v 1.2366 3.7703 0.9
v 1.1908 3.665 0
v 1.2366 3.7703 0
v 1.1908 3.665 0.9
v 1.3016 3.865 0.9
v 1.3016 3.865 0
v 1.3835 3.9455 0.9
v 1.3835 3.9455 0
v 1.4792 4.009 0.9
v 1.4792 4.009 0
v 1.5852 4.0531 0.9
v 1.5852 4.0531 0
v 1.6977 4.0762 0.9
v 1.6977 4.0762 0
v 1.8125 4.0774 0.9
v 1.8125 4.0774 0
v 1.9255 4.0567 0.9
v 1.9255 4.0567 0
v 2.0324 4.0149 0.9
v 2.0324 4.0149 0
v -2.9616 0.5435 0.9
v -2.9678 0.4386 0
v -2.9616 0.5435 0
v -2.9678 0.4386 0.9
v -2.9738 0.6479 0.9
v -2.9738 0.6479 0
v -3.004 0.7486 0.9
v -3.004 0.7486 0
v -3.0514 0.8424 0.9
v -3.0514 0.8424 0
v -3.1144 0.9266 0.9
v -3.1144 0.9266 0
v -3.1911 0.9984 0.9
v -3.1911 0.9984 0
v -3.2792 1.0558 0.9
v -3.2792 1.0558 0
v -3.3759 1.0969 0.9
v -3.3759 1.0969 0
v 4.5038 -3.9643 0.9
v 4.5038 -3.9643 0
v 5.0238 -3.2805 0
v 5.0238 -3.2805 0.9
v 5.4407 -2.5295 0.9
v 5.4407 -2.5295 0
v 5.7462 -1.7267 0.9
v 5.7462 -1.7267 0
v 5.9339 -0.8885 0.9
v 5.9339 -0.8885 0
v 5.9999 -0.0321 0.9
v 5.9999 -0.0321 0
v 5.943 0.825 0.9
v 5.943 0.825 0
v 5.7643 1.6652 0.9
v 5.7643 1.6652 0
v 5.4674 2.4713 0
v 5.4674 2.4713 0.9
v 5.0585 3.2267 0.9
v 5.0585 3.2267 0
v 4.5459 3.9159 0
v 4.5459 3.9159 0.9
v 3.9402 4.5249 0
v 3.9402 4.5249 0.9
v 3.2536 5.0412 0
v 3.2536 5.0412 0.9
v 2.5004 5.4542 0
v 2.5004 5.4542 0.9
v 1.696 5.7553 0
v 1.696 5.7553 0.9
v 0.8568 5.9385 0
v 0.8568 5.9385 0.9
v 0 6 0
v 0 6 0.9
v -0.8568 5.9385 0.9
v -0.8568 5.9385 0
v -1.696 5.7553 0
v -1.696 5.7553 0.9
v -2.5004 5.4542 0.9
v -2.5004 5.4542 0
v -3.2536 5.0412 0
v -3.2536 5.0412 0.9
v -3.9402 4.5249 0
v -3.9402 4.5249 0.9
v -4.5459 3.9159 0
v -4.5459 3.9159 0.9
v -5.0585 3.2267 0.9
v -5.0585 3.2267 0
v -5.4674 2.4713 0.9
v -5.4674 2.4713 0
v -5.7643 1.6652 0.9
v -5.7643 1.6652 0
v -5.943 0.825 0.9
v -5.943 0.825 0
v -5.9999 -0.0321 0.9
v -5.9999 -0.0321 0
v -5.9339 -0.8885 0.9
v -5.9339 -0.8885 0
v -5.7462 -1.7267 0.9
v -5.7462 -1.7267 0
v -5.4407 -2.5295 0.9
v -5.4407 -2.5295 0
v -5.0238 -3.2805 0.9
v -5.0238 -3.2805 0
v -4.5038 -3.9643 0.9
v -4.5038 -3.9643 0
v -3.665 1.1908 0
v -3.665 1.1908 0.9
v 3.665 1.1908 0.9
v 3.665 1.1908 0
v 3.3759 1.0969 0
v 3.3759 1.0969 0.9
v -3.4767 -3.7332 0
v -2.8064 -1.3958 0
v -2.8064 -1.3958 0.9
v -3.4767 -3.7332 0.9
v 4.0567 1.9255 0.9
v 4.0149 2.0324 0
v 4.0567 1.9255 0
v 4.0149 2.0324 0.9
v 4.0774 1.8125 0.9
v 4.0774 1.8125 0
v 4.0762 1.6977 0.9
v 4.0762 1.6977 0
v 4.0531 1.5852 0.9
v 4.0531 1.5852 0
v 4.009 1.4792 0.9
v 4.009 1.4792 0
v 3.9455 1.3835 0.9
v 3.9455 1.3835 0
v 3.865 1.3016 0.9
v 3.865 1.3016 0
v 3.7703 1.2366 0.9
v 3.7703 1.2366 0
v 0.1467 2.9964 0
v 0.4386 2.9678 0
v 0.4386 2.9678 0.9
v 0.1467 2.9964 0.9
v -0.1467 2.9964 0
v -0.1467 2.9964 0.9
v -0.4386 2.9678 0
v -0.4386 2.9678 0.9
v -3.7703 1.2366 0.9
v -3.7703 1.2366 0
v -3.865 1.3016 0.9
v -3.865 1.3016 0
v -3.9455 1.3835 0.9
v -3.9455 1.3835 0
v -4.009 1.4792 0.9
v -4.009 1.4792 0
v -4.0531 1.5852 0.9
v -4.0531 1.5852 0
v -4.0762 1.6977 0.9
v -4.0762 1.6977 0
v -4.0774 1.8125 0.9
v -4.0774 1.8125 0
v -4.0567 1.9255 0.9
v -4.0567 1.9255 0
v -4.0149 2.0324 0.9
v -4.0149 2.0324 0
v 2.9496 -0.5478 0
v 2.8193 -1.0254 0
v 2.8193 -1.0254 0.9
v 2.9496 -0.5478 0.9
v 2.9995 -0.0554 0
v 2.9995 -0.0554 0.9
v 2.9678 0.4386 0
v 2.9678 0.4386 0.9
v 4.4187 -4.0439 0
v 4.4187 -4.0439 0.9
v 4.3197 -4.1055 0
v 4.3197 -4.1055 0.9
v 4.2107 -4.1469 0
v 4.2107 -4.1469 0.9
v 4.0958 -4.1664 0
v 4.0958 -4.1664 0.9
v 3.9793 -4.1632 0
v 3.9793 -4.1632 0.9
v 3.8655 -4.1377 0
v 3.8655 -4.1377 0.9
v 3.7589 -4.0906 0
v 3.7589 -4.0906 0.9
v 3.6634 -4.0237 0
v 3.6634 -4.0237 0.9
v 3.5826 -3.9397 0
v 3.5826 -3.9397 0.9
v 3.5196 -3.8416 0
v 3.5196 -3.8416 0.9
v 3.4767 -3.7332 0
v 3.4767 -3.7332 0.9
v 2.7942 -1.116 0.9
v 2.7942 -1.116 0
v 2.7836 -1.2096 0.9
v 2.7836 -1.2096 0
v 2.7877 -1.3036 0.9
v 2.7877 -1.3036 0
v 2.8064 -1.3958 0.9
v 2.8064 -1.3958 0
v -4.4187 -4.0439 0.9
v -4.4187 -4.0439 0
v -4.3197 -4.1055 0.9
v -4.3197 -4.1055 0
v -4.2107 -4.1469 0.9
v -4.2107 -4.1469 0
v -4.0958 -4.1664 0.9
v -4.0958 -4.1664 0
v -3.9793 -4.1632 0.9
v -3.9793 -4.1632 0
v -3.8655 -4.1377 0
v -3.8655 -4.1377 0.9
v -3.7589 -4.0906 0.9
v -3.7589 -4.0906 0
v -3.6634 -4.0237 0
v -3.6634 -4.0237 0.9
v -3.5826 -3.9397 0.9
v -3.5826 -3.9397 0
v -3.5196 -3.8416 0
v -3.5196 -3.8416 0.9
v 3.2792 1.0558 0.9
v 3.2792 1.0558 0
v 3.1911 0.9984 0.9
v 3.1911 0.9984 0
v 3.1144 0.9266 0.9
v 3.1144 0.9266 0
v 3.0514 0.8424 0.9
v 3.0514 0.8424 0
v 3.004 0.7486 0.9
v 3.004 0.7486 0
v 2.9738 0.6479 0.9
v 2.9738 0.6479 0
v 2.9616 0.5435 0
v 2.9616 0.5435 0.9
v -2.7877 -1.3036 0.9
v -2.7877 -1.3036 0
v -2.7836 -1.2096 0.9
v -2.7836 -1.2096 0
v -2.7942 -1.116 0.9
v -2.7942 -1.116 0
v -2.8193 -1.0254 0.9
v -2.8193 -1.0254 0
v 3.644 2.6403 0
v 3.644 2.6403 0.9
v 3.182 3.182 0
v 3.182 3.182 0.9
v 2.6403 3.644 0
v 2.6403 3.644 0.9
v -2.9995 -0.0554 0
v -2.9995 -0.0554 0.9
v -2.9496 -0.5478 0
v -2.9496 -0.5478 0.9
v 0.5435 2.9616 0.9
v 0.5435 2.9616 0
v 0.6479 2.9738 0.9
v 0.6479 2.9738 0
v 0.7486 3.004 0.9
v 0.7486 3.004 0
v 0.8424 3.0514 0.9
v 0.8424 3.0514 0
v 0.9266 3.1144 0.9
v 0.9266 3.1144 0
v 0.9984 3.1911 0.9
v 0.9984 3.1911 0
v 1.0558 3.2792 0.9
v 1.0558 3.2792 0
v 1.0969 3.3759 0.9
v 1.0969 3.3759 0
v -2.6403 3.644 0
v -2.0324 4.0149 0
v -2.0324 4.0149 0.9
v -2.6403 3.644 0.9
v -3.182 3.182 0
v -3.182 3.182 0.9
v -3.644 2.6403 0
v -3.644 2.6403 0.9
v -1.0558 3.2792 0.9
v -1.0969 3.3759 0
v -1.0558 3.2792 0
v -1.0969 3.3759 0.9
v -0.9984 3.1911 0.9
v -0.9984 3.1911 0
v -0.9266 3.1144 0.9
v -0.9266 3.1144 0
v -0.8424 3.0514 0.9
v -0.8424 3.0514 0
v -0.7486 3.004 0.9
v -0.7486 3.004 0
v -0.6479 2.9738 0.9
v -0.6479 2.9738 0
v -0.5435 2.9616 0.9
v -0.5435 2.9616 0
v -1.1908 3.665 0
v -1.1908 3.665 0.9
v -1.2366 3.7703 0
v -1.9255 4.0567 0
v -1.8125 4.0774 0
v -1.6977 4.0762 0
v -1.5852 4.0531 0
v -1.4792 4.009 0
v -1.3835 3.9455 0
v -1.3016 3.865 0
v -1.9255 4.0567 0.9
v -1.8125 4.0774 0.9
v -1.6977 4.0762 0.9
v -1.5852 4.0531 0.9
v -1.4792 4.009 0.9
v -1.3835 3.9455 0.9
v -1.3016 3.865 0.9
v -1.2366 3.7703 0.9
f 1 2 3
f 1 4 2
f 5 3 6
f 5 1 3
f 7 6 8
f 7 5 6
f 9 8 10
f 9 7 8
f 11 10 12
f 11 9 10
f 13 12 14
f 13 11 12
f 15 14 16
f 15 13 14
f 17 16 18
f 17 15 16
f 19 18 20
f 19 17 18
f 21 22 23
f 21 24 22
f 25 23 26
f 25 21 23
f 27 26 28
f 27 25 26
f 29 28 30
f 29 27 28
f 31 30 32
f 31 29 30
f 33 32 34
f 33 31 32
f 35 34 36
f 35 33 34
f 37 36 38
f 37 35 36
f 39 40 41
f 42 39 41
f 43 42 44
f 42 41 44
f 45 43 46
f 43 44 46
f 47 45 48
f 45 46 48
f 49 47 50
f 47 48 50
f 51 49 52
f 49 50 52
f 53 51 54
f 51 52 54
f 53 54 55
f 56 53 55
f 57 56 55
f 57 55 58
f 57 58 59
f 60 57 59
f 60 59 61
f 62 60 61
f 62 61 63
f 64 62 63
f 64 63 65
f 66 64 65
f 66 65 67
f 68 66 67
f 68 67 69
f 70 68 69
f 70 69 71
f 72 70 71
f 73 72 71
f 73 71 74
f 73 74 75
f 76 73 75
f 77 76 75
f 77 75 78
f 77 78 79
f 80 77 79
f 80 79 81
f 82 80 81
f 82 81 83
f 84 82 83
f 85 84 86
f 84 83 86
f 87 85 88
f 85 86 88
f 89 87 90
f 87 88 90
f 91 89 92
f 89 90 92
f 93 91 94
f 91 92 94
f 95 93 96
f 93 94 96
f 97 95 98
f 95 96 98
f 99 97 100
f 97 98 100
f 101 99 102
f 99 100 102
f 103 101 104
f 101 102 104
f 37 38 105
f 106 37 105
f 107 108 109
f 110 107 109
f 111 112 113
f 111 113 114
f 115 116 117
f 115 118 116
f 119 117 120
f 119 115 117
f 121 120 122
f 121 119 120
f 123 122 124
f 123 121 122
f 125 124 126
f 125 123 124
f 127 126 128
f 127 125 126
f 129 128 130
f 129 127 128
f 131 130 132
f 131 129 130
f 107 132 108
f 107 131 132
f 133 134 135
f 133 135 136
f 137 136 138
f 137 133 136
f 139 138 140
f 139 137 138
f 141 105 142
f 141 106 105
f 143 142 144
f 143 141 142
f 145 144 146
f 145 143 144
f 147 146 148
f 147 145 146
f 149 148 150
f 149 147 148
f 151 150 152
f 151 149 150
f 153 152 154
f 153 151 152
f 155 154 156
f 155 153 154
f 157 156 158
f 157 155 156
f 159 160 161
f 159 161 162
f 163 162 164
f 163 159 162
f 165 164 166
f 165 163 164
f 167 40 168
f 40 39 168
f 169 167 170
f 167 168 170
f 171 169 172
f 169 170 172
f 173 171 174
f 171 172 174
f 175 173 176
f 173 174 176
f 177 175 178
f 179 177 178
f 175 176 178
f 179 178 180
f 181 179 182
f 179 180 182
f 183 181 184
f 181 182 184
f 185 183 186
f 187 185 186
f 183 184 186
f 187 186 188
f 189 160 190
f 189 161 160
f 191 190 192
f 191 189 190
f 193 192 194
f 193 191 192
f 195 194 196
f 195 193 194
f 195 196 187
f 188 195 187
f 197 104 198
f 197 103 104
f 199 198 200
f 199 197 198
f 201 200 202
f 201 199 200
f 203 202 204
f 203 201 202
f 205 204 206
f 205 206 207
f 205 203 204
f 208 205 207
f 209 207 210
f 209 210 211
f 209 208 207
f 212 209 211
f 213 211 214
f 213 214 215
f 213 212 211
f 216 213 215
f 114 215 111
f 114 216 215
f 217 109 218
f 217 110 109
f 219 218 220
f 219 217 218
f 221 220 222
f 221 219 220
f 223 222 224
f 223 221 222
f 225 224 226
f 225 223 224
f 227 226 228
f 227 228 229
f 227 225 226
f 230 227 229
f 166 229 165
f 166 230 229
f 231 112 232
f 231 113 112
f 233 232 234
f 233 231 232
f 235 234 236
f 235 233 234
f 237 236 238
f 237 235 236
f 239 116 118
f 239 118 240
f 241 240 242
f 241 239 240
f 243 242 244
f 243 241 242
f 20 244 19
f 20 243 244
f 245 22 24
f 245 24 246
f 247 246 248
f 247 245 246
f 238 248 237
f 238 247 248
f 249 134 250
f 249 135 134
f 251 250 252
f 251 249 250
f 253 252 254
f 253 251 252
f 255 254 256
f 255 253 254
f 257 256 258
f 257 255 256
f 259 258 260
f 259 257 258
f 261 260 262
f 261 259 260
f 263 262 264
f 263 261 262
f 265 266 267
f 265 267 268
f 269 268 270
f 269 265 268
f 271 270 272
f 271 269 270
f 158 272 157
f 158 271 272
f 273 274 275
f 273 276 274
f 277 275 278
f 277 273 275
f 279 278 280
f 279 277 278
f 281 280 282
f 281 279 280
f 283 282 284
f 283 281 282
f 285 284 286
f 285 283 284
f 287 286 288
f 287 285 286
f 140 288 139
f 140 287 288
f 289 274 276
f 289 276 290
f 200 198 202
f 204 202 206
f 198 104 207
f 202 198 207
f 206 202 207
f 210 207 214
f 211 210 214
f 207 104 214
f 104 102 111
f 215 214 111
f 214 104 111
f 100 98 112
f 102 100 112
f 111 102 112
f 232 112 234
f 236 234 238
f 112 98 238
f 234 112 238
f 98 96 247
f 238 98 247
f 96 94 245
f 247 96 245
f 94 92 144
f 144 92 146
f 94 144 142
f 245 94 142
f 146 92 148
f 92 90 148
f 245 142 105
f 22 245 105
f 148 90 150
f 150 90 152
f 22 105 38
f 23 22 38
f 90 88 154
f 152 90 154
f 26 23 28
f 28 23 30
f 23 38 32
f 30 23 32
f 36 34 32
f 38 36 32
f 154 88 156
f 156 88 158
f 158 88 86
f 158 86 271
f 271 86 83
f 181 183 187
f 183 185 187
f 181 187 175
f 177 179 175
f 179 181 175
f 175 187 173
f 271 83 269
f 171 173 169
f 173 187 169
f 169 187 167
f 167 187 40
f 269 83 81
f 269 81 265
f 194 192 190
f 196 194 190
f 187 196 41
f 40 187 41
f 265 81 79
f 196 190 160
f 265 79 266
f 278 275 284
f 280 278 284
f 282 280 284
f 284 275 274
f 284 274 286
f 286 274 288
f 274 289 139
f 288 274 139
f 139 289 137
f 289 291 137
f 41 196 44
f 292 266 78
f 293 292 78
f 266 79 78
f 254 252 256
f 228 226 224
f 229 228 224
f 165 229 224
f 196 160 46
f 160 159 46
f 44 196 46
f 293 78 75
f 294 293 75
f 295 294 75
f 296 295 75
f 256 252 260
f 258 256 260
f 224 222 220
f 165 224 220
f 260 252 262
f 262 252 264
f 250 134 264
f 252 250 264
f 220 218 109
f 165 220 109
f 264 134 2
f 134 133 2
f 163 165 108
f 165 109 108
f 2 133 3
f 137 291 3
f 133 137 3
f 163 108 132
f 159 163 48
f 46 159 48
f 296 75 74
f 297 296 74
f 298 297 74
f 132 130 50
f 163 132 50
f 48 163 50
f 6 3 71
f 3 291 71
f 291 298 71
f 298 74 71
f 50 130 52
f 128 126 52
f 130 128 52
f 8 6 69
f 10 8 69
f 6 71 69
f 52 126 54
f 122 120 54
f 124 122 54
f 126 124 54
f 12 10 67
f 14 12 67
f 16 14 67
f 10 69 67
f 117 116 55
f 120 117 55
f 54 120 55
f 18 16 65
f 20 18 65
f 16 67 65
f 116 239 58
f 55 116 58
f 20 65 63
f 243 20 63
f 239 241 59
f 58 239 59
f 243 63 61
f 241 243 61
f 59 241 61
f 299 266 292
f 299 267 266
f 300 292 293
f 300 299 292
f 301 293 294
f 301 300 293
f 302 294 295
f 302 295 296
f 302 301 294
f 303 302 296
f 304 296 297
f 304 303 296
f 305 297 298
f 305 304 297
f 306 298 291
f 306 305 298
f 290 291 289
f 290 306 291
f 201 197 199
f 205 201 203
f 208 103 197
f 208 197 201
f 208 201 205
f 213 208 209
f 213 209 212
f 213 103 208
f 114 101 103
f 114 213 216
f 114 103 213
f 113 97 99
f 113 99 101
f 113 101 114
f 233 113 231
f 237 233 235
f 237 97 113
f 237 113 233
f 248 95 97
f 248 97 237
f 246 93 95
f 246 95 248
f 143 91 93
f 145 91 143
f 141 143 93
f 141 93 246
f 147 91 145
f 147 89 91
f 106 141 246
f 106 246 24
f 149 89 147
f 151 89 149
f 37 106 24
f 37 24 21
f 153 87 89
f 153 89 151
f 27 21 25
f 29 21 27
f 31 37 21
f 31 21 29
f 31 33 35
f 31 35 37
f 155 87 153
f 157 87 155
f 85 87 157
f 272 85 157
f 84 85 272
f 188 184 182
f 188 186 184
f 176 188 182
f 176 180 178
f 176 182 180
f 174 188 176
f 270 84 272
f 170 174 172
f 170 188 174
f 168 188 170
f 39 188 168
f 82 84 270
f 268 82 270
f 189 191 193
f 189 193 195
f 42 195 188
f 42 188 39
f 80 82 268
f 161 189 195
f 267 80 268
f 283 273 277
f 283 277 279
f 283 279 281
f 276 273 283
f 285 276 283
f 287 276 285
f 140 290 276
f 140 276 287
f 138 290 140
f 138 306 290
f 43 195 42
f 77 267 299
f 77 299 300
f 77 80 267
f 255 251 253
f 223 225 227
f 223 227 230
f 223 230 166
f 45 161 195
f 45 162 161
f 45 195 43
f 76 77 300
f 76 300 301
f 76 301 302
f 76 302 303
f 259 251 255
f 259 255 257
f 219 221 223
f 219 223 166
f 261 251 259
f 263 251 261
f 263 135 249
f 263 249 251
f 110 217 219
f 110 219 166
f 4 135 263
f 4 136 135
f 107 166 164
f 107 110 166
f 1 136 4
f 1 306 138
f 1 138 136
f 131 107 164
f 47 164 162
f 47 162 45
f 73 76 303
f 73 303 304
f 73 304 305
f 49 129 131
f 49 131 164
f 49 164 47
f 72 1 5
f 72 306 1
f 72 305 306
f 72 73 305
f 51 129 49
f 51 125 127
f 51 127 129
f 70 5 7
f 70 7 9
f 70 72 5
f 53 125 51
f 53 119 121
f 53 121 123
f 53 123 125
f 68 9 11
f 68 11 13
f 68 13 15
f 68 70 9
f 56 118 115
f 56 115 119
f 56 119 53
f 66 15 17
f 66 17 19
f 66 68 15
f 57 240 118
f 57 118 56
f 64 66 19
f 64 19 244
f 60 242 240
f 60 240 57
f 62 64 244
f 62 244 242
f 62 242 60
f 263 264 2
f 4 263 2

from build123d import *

# Parameters (mm, degrees)
PAD_DEPTH = 0.9
FILLET_R  = 0.6


with BuildPart() as part:
    # Sketch → Pad (new body)
    with BuildSketch(Plane.XY):
        with BuildLine():
            ThreePointArc((3.749388, -4.684238), (0, 6), (-3.749388, -4.684238))
            Line((-2.75, -1.198958), (-3.749388, -4.684238))
            ThreePointArc((-2.85317, 0.927051), (-2.996474, -0.145411), (-2.75, -1.198958))
            Line((-2.85317, 0.927051), (-4.279754, 1.390576))
            ThreePointArc((-1.390576, 4.279754), (-3.181981, 3.181981), (-4.279754, 1.390576))
            Line((-0.927051, 2.85317), (-1.390576, 4.279754))
            ThreePointArc((0.927051, 2.85317), (0, 3), (-0.927051, 2.85317))
            Line((0.927051, 2.85317), (1.390576, 4.279754))
            ThreePointArc((4.279754, 1.390576), (3.181981, 3.181981), (1.390576, 4.279754))
            Line((4.279754, 1.390576), (2.85317, 0.927051))
            ThreePointArc((2.75, -1.198958), (2.996474, -0.145411), (2.85317, 0.927051))
            Line((2.75, -1.198958), (3.749388, -4.684238))
        make_face()
    extrude(amount=PAD_DEPTH)

    # Fillet
    fillet_edges = [part.edges().sort_by_distance(p)[0] for p in [
        (3.749388, -4.684238, 0.45),
        (2.75, -1.198958, 0.45),
        (2.85317, 0.927051, 0.45),
        (4.279754, 1.390576, 0.45),
        (1.390576, 4.279754, 0.45),
        (0.927051, 2.85317, 0.45),
        (-0.927051, 2.85317, 0.45),
        (-1.390576, 4.279754, 0.45),
        (-4.279754, 1.390576, 0.45),
        (-2.85317, 0.927051, 0.45),
        (-2.75, -1.198958, 0.45),
        (-3.749388, -4.684238, 0.45),
    ]]
    fillet(fillet_edges, radius=FILLET_R)


solid = part.part
